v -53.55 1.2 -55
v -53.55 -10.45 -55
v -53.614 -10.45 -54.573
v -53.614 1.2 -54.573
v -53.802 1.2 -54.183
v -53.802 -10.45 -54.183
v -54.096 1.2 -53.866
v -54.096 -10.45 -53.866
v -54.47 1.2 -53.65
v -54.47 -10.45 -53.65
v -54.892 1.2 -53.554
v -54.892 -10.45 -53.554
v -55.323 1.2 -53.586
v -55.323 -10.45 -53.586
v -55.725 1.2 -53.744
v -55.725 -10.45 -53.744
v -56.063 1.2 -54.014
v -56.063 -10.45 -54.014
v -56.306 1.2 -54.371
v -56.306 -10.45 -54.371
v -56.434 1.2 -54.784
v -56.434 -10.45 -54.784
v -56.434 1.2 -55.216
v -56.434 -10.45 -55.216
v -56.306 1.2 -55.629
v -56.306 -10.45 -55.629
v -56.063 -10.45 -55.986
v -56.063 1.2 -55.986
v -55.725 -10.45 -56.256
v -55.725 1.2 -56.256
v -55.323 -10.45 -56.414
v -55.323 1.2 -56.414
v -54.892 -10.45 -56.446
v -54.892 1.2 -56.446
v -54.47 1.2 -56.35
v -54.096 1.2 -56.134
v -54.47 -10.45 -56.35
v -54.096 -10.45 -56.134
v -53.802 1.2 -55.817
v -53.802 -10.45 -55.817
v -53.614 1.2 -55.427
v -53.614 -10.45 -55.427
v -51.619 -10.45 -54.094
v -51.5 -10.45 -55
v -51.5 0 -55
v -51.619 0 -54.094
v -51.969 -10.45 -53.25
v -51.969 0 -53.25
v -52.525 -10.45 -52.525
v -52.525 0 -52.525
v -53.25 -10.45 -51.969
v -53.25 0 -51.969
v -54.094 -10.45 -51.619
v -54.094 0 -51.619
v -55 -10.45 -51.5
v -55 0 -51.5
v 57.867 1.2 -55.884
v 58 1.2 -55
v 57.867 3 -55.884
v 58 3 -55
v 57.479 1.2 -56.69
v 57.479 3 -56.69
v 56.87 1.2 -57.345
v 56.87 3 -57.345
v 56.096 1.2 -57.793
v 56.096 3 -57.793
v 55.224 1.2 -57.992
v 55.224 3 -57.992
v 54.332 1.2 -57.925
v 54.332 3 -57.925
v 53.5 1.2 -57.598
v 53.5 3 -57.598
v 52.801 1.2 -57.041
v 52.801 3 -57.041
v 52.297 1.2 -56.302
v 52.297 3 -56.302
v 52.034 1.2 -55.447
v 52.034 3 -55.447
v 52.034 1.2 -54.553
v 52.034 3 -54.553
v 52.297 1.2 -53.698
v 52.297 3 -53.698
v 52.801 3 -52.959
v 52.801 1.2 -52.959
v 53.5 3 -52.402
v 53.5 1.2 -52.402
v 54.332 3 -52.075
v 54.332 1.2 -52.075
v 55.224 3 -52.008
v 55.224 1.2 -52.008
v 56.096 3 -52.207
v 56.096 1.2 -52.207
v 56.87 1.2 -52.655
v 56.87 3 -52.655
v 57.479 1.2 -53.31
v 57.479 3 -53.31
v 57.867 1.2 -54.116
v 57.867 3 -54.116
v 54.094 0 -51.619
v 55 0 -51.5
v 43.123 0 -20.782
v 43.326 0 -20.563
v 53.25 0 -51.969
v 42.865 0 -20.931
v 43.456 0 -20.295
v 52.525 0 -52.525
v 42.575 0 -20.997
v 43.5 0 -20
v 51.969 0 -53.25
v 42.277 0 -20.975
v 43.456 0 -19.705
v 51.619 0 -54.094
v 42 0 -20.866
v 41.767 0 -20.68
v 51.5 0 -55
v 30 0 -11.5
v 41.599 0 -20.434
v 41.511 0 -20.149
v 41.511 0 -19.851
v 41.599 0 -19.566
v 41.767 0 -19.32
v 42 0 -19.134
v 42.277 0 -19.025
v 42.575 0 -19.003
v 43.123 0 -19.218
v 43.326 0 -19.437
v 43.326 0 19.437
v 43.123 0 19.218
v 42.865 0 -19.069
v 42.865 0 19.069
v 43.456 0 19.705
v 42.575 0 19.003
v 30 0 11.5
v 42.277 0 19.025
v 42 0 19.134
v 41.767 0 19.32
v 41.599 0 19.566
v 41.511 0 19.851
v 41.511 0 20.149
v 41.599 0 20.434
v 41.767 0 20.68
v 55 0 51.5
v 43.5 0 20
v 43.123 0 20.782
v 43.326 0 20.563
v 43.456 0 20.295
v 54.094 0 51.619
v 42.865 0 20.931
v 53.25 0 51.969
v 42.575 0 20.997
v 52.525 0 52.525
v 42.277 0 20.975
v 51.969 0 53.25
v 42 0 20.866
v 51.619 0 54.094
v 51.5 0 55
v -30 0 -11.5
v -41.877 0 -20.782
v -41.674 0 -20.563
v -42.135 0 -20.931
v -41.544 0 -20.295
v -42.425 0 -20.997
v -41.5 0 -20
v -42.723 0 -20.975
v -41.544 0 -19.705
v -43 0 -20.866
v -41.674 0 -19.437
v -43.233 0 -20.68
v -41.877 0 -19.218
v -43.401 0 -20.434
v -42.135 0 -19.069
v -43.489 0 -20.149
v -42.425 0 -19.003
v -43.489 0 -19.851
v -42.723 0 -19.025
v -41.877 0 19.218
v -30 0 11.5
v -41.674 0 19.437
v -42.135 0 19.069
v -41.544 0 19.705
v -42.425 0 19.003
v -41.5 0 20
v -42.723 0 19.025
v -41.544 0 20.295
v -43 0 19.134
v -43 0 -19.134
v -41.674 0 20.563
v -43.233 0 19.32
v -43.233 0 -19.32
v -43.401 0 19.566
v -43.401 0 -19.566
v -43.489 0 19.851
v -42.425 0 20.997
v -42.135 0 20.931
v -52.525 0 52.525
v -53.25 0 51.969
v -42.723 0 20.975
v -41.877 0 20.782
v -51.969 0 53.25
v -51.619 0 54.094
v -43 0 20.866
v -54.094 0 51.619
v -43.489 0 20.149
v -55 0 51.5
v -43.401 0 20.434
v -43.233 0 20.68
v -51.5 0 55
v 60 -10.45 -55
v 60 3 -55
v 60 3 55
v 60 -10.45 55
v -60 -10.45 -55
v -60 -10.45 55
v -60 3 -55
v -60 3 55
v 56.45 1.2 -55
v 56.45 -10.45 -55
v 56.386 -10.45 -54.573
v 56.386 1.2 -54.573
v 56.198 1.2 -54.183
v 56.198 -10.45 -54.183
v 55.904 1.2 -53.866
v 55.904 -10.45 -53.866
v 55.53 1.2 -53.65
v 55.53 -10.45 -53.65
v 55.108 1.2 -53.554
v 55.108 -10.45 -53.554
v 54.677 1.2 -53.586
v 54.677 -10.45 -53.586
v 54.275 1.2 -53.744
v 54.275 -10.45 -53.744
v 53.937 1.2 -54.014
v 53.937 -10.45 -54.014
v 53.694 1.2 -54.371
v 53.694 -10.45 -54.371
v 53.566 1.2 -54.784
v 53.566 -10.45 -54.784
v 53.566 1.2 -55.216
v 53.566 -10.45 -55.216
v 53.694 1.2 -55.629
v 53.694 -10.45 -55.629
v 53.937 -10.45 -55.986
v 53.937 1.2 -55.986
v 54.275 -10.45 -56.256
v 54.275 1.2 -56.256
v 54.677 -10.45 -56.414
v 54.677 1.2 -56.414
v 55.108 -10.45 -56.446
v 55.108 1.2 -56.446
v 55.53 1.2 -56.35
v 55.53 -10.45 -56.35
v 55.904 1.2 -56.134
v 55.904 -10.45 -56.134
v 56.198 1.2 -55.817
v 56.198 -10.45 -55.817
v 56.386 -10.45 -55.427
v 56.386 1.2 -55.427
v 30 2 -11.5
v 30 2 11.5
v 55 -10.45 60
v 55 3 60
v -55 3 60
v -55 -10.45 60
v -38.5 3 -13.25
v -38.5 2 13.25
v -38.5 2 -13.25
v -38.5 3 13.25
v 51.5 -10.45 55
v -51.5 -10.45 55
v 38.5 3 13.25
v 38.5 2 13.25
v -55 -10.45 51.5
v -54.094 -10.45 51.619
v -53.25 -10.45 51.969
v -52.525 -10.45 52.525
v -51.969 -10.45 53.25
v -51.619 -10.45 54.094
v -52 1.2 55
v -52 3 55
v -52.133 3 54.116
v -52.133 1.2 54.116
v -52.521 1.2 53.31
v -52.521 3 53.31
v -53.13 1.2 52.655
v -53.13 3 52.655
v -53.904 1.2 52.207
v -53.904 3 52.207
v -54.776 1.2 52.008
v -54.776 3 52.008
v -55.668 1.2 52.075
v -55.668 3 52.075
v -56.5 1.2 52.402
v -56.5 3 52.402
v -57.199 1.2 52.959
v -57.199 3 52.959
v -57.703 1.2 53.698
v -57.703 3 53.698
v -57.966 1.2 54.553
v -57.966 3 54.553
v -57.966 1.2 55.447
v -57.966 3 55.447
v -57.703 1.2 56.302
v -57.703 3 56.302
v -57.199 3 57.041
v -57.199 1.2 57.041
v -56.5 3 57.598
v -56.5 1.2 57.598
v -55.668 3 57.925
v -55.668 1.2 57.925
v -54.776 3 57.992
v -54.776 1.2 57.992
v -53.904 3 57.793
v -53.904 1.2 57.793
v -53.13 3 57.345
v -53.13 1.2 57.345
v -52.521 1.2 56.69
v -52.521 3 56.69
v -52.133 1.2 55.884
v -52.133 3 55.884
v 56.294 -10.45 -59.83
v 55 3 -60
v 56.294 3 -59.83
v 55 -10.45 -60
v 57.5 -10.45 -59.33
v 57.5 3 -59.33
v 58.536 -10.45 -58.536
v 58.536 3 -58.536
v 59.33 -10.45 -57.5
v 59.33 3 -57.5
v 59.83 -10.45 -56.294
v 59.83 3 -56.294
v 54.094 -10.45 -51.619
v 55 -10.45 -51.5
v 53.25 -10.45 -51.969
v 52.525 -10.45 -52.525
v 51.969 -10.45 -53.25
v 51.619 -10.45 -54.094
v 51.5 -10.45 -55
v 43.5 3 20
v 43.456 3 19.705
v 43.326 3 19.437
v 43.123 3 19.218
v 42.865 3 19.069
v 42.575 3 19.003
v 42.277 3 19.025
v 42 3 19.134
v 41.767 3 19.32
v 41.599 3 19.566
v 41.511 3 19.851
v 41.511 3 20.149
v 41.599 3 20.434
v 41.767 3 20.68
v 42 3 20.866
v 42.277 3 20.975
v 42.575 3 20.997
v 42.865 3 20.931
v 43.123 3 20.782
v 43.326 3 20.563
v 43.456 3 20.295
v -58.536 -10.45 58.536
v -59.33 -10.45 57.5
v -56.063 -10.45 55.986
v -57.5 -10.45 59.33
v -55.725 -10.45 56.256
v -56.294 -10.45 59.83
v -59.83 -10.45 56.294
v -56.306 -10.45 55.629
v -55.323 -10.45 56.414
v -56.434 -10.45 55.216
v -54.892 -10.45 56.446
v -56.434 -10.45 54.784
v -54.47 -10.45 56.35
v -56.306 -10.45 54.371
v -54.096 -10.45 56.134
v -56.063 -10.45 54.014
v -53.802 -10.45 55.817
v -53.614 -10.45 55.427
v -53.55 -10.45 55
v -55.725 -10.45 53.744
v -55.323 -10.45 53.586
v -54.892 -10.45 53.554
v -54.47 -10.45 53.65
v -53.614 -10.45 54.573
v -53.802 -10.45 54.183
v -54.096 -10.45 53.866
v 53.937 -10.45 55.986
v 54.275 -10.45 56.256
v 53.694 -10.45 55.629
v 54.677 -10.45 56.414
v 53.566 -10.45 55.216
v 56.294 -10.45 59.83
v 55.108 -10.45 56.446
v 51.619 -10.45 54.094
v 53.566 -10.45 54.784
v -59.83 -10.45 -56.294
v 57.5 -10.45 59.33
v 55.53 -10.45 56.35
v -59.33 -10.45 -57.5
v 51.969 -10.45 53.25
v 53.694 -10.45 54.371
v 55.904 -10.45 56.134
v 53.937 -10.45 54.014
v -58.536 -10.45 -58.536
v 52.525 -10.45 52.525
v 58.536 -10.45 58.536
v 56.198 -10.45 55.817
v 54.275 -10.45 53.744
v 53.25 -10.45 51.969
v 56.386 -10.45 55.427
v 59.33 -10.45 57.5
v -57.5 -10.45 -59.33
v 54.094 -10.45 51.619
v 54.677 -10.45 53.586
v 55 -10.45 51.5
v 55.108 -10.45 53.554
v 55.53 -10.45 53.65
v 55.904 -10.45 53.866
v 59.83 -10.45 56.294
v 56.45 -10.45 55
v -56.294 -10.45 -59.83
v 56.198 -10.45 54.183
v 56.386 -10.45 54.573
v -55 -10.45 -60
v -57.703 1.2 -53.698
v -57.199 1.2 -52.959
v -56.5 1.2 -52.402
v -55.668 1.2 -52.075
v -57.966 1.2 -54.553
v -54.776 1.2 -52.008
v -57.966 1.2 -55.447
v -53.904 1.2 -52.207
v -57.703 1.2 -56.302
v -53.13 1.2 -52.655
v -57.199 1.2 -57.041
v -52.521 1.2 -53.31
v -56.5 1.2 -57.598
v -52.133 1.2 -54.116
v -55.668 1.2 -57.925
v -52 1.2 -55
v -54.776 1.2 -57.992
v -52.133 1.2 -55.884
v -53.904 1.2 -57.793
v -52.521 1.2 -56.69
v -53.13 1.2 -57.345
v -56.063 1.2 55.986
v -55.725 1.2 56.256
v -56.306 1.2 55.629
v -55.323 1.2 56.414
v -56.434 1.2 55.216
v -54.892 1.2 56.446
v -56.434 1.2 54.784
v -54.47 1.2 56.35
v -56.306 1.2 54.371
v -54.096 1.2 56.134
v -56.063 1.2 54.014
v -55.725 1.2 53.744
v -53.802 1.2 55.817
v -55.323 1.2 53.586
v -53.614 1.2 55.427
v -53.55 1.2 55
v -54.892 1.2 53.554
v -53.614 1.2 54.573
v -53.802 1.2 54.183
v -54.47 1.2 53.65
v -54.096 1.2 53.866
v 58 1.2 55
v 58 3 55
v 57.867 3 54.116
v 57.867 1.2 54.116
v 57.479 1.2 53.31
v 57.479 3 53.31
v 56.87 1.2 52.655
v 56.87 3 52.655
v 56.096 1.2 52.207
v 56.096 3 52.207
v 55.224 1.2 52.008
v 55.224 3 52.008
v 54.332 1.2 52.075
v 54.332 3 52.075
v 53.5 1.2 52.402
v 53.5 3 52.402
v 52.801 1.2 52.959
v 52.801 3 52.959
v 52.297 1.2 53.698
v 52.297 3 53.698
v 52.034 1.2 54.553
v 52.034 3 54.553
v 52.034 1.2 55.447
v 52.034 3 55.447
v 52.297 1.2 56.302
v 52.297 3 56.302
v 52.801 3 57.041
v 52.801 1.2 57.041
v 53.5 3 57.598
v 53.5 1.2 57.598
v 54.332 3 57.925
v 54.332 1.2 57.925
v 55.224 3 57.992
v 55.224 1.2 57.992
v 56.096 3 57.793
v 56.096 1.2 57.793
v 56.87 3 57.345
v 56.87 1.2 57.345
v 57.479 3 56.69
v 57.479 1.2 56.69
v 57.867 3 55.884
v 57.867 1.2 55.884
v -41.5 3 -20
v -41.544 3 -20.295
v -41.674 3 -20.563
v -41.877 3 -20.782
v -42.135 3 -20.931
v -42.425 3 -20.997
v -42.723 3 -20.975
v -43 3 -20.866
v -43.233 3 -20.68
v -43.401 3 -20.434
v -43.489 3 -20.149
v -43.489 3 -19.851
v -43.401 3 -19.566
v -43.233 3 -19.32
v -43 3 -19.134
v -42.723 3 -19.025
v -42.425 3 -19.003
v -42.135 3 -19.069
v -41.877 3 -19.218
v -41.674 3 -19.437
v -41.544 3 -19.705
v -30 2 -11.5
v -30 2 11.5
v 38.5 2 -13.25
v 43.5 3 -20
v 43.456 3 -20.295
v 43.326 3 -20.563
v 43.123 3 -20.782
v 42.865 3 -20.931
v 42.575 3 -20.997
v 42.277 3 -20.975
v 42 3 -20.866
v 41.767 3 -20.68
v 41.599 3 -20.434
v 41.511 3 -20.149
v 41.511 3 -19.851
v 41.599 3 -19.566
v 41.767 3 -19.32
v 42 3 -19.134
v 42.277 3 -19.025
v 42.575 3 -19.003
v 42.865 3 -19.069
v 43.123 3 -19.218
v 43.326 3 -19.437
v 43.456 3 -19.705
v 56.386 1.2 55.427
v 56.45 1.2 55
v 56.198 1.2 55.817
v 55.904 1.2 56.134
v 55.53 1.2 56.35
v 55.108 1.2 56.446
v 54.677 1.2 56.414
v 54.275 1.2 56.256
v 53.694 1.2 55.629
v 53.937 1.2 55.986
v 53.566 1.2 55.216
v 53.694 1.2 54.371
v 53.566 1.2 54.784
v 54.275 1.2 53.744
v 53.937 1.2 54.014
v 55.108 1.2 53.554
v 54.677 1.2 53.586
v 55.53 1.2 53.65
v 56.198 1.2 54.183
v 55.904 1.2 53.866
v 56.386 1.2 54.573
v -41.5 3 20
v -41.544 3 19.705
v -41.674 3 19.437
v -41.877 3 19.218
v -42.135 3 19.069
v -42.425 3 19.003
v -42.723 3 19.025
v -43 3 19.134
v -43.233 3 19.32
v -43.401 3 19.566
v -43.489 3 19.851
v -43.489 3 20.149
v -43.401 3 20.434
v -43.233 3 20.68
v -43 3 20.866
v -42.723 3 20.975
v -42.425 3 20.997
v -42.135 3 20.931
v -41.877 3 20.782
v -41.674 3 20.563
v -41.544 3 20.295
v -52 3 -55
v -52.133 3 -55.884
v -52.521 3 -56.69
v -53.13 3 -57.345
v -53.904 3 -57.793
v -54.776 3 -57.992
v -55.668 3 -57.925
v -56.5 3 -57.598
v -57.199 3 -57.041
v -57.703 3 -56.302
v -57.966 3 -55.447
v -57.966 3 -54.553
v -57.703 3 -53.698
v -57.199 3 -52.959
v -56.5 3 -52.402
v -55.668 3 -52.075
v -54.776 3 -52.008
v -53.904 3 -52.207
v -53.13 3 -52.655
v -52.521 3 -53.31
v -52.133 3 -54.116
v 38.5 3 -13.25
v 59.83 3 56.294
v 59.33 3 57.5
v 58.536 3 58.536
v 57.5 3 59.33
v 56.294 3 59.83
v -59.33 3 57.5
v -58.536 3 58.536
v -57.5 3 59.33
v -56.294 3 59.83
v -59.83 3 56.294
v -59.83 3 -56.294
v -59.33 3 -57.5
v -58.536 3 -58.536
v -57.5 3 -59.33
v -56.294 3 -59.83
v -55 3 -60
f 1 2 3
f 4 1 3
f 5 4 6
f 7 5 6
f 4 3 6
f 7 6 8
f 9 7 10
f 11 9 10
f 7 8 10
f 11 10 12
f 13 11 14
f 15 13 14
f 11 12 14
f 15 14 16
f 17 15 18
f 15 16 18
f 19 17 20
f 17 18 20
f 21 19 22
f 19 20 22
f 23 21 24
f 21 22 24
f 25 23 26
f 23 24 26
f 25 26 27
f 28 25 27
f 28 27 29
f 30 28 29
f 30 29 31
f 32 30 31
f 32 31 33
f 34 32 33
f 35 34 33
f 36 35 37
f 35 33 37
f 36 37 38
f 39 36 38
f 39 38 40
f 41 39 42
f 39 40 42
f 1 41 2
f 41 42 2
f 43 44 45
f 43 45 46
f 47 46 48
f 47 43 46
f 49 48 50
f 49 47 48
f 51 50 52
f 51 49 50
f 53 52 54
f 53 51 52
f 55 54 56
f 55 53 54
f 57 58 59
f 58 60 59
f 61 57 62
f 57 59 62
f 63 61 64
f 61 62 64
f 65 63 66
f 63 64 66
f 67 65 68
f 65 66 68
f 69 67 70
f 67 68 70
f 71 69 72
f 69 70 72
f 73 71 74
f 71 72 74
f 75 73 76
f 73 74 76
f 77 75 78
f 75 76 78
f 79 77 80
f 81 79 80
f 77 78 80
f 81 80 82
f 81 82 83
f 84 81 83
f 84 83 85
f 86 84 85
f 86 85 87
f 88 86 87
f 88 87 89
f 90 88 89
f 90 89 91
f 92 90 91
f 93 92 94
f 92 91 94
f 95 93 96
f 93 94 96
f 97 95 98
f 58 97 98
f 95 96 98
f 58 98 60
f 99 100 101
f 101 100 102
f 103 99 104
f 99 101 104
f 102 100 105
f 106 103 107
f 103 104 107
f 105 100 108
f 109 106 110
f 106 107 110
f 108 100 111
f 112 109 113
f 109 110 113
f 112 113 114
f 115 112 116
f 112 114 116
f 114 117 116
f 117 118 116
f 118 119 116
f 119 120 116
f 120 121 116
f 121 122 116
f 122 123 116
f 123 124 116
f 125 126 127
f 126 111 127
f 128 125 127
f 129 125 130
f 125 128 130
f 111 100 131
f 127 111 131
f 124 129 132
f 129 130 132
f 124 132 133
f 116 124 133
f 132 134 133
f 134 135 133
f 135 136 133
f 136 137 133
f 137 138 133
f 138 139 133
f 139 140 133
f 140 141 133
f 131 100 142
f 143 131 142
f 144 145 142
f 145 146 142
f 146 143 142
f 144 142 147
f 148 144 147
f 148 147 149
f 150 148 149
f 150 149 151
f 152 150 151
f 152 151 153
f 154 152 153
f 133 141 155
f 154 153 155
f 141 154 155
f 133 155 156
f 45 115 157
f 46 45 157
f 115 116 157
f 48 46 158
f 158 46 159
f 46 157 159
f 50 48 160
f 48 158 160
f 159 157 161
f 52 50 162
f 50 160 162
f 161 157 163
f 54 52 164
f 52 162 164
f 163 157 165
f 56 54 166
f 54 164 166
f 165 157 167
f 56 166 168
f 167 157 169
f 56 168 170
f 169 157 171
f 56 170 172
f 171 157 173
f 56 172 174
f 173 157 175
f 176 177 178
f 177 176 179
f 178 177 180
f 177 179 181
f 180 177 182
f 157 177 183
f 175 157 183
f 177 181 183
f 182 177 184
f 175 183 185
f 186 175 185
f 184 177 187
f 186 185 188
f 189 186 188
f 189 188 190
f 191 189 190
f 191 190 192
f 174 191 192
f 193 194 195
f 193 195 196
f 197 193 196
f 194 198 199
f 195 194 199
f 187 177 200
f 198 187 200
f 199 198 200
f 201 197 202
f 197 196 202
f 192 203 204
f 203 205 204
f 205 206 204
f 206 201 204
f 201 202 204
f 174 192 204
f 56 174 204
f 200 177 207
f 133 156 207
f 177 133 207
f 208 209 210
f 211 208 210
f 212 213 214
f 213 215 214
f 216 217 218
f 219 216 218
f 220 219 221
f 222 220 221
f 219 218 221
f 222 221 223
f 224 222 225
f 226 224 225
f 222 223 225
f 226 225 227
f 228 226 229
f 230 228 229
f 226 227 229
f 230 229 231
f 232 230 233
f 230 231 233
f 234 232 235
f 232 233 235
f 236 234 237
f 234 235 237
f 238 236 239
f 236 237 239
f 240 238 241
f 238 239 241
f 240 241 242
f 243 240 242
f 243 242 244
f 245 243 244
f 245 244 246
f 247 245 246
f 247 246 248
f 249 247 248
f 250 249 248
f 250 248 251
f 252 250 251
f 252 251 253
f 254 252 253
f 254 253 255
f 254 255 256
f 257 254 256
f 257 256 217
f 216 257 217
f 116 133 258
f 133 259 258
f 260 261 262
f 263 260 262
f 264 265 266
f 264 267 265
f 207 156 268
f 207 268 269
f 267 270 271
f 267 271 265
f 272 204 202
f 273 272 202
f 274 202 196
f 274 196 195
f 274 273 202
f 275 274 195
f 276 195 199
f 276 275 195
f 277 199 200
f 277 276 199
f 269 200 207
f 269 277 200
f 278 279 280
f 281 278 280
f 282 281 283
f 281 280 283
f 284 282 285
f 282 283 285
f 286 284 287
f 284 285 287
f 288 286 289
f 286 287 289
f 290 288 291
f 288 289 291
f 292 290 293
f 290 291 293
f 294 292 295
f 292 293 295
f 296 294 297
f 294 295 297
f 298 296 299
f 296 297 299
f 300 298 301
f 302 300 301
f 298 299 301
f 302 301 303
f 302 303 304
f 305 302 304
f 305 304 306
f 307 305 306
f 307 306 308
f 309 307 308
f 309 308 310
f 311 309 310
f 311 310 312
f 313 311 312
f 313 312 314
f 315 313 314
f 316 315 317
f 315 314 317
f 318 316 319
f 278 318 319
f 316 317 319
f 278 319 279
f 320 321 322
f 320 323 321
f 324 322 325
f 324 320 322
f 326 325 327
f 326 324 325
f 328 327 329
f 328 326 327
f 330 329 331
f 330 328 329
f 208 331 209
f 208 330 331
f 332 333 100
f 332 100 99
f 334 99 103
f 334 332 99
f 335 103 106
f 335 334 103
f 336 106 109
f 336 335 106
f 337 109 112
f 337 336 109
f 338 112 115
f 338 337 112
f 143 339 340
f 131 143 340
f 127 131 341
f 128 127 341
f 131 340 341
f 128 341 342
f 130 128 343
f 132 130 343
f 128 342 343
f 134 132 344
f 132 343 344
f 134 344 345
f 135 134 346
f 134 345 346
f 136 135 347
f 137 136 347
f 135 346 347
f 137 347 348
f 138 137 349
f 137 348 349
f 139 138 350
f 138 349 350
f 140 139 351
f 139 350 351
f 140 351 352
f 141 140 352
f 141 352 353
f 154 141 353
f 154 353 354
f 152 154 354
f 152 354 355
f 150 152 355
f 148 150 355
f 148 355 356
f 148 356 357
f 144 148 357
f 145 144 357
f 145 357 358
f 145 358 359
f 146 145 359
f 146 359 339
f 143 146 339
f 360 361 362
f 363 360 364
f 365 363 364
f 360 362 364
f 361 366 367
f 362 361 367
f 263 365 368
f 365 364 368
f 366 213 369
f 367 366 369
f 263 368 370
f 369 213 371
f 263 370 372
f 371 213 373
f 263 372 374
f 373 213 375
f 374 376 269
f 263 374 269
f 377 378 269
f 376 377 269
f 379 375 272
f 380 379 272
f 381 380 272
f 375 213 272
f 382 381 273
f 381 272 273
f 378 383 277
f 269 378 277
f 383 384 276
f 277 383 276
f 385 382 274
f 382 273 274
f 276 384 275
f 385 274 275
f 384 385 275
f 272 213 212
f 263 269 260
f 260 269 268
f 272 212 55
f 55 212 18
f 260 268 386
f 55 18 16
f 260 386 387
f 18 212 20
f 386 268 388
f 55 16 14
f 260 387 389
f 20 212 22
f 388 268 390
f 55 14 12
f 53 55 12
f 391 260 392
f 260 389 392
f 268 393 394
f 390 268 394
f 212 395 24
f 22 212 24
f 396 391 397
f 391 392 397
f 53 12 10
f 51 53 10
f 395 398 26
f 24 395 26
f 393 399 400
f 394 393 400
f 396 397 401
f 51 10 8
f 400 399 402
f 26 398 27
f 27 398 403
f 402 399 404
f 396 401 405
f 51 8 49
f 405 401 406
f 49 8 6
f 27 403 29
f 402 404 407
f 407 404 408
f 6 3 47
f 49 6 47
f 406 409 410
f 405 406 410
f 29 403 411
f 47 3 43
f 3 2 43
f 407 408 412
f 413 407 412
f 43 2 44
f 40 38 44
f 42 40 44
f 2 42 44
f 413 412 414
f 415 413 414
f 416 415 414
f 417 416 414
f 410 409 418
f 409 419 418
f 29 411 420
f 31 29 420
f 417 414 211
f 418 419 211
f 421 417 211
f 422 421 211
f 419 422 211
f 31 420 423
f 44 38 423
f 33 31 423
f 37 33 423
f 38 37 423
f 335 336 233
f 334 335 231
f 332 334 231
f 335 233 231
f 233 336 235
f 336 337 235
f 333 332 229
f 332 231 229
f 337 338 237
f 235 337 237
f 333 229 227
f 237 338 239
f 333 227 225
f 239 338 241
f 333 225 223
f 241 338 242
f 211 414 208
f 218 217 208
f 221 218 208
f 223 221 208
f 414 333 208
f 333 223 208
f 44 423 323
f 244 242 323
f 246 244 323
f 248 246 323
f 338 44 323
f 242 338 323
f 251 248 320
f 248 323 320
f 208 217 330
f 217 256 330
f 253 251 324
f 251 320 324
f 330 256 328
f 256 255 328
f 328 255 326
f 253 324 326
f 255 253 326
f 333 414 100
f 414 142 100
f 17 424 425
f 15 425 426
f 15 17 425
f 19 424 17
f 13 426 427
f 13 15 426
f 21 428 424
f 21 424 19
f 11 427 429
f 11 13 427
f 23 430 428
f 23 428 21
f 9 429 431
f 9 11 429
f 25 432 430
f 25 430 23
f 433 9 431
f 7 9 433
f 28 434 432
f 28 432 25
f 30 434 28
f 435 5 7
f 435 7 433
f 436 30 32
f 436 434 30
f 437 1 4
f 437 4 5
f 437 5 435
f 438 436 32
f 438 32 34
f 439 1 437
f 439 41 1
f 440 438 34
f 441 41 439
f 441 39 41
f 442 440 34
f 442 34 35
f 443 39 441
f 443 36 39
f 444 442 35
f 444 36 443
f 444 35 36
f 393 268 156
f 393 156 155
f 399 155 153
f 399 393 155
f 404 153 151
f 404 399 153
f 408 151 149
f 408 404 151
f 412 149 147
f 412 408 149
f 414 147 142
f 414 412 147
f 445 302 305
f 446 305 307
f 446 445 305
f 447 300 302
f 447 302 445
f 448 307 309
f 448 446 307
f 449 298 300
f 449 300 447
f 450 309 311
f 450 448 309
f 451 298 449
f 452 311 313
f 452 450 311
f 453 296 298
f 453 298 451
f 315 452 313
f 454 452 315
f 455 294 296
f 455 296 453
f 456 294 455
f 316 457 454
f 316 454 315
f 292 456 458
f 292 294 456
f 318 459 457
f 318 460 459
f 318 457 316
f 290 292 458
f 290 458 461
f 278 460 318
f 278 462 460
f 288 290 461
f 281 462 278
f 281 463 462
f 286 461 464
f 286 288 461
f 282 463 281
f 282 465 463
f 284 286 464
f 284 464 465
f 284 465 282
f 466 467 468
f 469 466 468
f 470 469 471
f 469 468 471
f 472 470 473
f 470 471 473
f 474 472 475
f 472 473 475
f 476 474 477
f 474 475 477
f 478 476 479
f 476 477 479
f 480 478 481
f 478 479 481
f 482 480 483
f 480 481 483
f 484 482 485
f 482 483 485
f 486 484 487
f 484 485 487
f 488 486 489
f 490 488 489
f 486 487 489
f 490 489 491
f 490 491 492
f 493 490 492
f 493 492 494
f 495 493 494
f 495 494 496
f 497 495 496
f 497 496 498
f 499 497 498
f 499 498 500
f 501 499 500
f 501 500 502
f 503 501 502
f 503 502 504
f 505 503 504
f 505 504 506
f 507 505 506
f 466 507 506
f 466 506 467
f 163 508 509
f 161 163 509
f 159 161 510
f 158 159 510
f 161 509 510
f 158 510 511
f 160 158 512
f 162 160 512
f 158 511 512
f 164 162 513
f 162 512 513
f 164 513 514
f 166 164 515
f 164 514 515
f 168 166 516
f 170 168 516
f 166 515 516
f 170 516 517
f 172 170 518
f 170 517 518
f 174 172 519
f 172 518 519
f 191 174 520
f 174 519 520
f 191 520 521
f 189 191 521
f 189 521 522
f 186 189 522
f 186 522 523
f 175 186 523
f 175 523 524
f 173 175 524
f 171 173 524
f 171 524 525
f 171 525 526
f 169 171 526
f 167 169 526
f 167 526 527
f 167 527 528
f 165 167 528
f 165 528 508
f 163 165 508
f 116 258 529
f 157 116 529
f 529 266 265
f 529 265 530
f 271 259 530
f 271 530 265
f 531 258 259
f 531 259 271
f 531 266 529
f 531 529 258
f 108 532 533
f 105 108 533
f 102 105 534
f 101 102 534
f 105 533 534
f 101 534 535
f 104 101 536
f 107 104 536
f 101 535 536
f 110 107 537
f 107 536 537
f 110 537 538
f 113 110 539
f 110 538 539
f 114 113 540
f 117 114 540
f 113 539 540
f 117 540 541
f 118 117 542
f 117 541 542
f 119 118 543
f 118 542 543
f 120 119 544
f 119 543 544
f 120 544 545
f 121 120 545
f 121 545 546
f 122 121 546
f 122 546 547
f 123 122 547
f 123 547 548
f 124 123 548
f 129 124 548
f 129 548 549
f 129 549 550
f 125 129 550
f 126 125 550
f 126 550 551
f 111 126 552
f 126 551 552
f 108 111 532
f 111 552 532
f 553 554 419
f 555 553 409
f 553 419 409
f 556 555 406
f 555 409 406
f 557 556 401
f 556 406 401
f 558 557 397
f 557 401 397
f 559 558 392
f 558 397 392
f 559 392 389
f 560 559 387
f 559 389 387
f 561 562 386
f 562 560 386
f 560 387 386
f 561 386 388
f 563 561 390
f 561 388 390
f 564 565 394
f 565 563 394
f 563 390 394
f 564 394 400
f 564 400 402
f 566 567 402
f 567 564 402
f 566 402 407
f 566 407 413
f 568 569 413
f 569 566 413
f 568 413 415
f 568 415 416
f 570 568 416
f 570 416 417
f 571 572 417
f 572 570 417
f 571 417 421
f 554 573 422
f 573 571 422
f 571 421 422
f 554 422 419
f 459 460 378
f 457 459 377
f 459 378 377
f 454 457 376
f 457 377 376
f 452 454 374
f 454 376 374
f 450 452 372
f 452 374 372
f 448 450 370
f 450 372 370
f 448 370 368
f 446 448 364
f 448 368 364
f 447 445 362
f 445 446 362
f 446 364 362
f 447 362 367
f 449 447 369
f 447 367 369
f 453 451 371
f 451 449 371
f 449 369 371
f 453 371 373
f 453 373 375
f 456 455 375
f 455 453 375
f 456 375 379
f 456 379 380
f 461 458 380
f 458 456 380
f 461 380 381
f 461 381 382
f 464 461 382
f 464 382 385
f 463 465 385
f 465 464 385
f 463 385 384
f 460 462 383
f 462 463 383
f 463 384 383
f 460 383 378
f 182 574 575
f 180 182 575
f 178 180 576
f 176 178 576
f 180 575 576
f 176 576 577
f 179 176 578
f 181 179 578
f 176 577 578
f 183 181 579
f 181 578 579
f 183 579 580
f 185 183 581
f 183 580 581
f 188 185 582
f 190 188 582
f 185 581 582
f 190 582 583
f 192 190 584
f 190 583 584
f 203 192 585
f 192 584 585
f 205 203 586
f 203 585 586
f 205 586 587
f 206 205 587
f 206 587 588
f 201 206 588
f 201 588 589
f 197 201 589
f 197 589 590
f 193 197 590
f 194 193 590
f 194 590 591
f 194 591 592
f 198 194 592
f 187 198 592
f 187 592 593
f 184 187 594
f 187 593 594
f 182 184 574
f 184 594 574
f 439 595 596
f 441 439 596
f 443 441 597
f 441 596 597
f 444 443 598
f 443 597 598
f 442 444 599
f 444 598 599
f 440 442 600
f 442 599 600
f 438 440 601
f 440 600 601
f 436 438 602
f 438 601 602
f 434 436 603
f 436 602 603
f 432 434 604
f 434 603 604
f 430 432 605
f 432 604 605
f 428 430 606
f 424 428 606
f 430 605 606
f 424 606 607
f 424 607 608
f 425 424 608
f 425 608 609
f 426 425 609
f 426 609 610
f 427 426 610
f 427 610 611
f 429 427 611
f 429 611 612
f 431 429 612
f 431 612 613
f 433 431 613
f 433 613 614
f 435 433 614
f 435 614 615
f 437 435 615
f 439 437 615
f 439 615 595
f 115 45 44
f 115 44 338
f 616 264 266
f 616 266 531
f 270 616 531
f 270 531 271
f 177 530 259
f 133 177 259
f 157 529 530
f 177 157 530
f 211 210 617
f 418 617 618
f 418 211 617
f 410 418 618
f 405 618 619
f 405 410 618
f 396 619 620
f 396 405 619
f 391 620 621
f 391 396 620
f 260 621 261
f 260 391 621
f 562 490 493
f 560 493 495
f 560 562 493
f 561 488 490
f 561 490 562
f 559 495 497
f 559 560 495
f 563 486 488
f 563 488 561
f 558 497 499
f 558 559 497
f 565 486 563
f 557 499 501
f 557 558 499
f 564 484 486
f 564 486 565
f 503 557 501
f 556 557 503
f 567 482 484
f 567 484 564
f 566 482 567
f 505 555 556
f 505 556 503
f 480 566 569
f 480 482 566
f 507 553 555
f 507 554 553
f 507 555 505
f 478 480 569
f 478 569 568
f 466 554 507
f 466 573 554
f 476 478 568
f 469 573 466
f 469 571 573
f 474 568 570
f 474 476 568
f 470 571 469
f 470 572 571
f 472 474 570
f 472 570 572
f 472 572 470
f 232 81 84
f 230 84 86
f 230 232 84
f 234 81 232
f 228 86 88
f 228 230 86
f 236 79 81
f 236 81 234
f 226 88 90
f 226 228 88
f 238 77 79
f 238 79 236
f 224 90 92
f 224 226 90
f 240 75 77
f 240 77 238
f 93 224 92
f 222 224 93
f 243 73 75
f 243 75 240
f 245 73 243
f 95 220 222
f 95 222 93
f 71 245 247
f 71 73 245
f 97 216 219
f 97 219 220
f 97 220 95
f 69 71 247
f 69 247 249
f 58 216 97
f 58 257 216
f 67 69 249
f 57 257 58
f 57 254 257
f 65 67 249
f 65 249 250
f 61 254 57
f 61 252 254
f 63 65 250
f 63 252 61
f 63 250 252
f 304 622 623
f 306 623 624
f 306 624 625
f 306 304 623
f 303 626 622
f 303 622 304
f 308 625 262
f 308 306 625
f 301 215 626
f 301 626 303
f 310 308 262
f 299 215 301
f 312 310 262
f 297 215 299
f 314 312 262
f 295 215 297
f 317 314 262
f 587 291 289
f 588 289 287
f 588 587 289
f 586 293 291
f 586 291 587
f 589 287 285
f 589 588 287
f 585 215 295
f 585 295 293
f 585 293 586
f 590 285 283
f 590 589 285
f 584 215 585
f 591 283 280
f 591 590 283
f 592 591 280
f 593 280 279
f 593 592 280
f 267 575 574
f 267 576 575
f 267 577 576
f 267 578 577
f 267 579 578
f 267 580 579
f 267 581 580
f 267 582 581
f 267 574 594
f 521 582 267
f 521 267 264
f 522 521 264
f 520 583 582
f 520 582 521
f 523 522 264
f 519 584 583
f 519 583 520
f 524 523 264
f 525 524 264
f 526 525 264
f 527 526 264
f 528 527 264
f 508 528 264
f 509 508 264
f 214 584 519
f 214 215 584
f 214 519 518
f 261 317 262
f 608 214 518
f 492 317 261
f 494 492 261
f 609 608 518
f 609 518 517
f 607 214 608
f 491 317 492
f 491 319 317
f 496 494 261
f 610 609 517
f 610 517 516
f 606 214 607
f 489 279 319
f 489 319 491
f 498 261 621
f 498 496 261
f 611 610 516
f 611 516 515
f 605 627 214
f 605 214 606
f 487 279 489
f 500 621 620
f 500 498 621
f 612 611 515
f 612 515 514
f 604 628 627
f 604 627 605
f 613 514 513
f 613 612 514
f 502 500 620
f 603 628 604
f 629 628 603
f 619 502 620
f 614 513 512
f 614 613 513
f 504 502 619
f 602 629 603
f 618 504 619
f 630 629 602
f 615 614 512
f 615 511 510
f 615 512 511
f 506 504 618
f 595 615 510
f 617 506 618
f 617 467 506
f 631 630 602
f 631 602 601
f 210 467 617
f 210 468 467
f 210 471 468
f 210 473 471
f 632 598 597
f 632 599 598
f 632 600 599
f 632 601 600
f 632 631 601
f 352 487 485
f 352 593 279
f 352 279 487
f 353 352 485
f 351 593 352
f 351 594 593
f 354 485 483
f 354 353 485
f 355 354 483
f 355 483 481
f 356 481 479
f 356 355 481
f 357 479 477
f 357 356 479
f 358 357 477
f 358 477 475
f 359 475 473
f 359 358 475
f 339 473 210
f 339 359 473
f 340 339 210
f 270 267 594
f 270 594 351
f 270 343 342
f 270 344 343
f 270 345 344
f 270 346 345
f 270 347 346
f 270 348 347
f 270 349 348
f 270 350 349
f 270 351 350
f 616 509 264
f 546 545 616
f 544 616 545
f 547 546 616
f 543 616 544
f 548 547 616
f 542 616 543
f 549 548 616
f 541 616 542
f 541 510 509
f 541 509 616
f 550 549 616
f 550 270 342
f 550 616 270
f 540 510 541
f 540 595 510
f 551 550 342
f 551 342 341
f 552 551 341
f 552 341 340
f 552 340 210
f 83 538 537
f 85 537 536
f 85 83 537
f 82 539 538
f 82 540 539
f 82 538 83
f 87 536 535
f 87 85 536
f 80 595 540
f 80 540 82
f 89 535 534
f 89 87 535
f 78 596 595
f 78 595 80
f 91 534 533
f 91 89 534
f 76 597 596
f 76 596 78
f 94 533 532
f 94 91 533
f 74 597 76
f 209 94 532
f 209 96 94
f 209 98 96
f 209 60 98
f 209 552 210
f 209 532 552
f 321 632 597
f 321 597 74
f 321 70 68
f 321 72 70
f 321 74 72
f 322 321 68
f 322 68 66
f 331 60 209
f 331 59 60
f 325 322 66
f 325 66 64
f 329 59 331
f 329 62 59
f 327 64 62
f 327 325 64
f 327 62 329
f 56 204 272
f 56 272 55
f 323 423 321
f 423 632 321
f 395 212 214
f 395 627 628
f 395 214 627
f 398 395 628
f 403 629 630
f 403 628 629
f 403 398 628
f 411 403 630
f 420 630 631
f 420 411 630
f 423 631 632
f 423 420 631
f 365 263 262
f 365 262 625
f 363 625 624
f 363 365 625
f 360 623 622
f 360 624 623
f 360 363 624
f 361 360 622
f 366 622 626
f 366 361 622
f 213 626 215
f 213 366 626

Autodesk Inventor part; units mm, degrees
ref_plane "YZ Plane" through (0, 0, 0) normal (1, 0, 0) x (0, 1, 0)
ref_plane "XZ Plane" through (0, 0, 0) normal (0, 1, 0) x (-1, 0, 0)
ref_plane "XY Plane" through (0, 0, 0) normal (0, 0, 1) x (1, 0, 0)
sketch "Sketch1" plane through (0, 0, 0) normal (0, 1, 0) x (-1, 0, 0)
  line L0 (-55, 55) -> (55, 55)
  line L1 (55, 55) -> (55, -55)
  line L2 (55, -55) -> (-55, -55)
  line L3 (-55, -55) -> (-55, 55)
  line L4 (-55, 55) -> (55, -55) construction
  line L5 (55, 55) -> (-55, -55) construction
  line L6 (-12.5, 37.5) -> (12.5, 37.5) construction
  line L7 (12.5, 37.5) -> (12.5, -37.5) construction
  line L8 (12.5, -37.5) -> (-12.5, -37.5) construction
  line L9 (-12.5, -37.5) -> (-12.5, 37.5) construction
  line L10 (-12.5, 37.5) -> (12.5, -37.5) construction
  line L11 (12.5, 37.5) -> (-12.5, -37.5) construction
  line L12 (-37.5, 37.5) -> (37.5, 37.5) construction
  line L13 (37.5, 37.5) -> (37.5, -37.5) construction
  line L14 (37.5, -37.5) -> (-37.5, -37.5) construction
  line L15 (-37.5, -37.5) -> (-37.5, 37.5)
  line L16 (-37.5, 37.5) -> (37.5, -37.5) construction
  line L17 (37.5, 37.5) -> (-37.5, -37.5) construction
  circle A0 centre (37.5, -37.5) radius 2 construction
  circle A1 centre (37.5, 37.5) radius 2 construction
  circle A2 centre (-37.5, 37.5) radius 2 construction
  circle A3 centre (-37.5, -37.5) radius 2 construction
  point P0 (0, 0)
  dimension "d0" = 110
  dimension "d1" = 110
  dimension "d2" = 25
  dimension "d3" = 75
  dimension "d4" = 75
  dimension "d5" = 4
  dimension "d6" = 4
  dimension "d7" = 4
  dimension "d8" = 4
extrude "Extrusion1" add sketch "Sketch1" along normal blind 3
sketch "Sketch3" plane through (0, 3, 0) normal (0, 1, 0) x (1, 0, 0)
  line L0 (35, -35) -> (-35, -35)
  line L1 (-35, -35) -> (-35, 35)
  line L2 (-35, 35) -> (35, 35)
  line L3 (35, 35) -> (35, -35)
  line L4 (35, -35) -> (-35, 35) construction
  line L5 (-35, -35) -> (35, 35) construction
  point P0 (0, 0)
  dimension "d18" = 70
  dimension "d19" = 70
extrude "Extrusion3" [suppressed]
fillet "Fillet1" [suppressed]
sketch "Sketch4" plane through (0, 3, 0) normal (0, 1, 0) x (1, 0, 0)
  line L0 (28, -16) -> (42, -16)
  line L1 (42, -16) -> (42, 16)
  line L2 (42, 16) -> (28, 16)
  line L3 (28, 16) -> (28, -16)
  line L4 (28, -16) -> (42, 16) construction
  line L5 (42, -16) -> (28, 16) construction
  line L6 (35, 33) -> (35, -33) projected
  point P0 (0, 0)
  point P1 (35, 0)
  dimension "d23" = 14
  dimension "d24" = 32
extrude "Extrusion4" [suppressed]
sketch "Sketch5" plane through (0, 3, 0) normal (0, 1, 0) x (1, 0, 0)
  line L0 (-30, -11.5) -> (30, -11.5)
  line L1 (30, -11.5) -> (30, 11.5)
  line L2 (30, 11.5) -> (-30, 11.5)
  line L3 (-30, 11.5) -> (-30, -11.5)
  line L4 (-30, -11.5) -> (30, 11.5) construction
  line L5 (30, -11.5) -> (-30, 11.5) construction
  point P0 (0, 0)
  dimension "d31" = 23
  dimension "d32" = 60
extrude "Extrusion5" cut sketch "Sketch5" against normal blind 10
sketch "Sketch6" plane through (0, 3, 0) normal (0, 1, 0) x (1, 0, 0)
  line L0 (-38.5, 13.25) -> (38.5, 13.25)
  line L1 (38.5, 13.25) -> (38.5, -13.25)
  line L2 (38.5, -13.25) -> (-38.5, -13.25)
  line L3 (-38.5, -13.25) -> (-38.5, 13.25)
  line L4 (-38.5, 13.25) -> (38.5, -13.25) construction
  line L5 (38.5, 13.25) -> (-38.5, -13.25) construction
  point P0 (0, 0)
  dimension "d35" = 26.5
  dimension "d36" = 77
extrude "Extrusion6" cut sketch "Sketch6" against normal blind 1
sketch "Sketch7" plane through (0, 3, 0) normal (0, 1, 0) x (1, 0, 0)
  line L0 (-42.5, -20) -> (42.5, -20) construction
  line L1 (42.5, -20) -> (42.5, 20) construction
  line L2 (42.5, 20) -> (-42.5, 20) construction
  line L3 (-42.5, 20) -> (-42.5, -20) construction
  line L4 (-42.5, -20) -> (42.5, 20) construction
  line L5 (42.5, -20) -> (-42.5, 20) construction
  circle A0 centre (-42.5, 20) radius 1
  circle A1 centre (42.5, 20) radius 1
  circle A2 centre (42.5, -20) radius 1
  circle A3 centre (-42.5, -20) radius 1
  point P0 (0, 0)
  dimension "d39" = 40
  dimension "d40" = 85
  dimension "d41" = 2
  dimension "d42" = 2
  dimension "d43" = 2
  dimension "d44" = 2
extrude "Extrusion7" cut sketch "Sketch7" against normal through all
sketch "Sketch8" plane through (0, 3, 0) normal (0, 1, 0) x (1, 0, 0)
  line L0 (55, -55) -> (55, 55) projected
  line L1 (-55, 55) -> (55, 55)
  line L2 (55, 55) -> (55, -55)
  line L3 (55, -55) -> (-55, -55)
  line L4 (-55, -55) -> (-55, 55)
  line L5 (-55, 55) -> (55, -55) construction
  line L6 (55, 55) -> (-55, -55) construction
  line L7 (-60, 60) -> (60, 60)
  line L8 (60, 60) -> (60, -60)
  line L9 (60, -60) -> (-60, -60)
  line L10 (-60, -60) -> (-60, 60)
  line L11 (-60, 60) -> (60, -60) construction
  line L12 (60, 60) -> (-60, -60) construction
  point P0 (0, 0)
  dimension "d47" = 5
extrude "Extrusion8" add sketch "Sketch8" against normal blind 13.45
sketch "Sketch9" plane through (0, -10.45, 0) normal (0, -1, 0) x (1, 0, 0)
  line L0 (-55, 55) -> (55, 55) projected
  circle A0 centre (-55, 55) radius 3.5
  line L1 (55, 55) -> (55, -55) projected
  circle A1 centre (55, 55) radius 3.5
  line L2 (55, -55) -> (-55, -55) projected
  circle A2 centre (55, -55) radius 3.5
  circle A3 centre (-55, -55) radius 3.5
  point P0 (0, 0)
  dimension "d50" = 7
  dimension "d51" = 7
  dimension "d52" = 7
  dimension "d53" = 7
extrude "Extrusion9" add sketch "Sketch9" against normal blind 13.45
fillet "Fillet3" radius 5 4 edges at (60, -3.725, -60) (60, -3.725, 60) (-60, -3.725, -60) (-60, -3.725, 60)
sketch "Sketch10" plane through (0, -10.45, 0) normal (0, -1, 0) x (1, 0, 0)
  arc A0 (-55, 51.5) -> (-51.5, 55) centre (-55, 55) ccw projected
  circle A1 centre (-55, 55) radius 1.45
  arc A2 (51.5, 55) -> (55, 51.5) centre (55, 55) ccw projected
  circle A3 centre (55, 55) radius 1.45
  arc A4 (55, -51.5) -> (51.5, -55) centre (55, -55) ccw projected
  circle A5 centre (55, -55) radius 1.45
  arc A6 (-51.5, -55) -> (-55, -51.5) centre (-55, -55) ccw projected
  circle A7 centre (-55, -55) radius 1.45
  point P0 (0, 0)
  dimension "d57" = 2.9
  dimension "d58" = 2.9
  dimension "d59" = 2.9
  dimension "d60" = 2.9
extrude "Extrusion10" cut sketch "Sketch10" against normal blind 13.45
sketch "Sketch11" plane through (0, 3, 0) normal (0, 1, 0) x (1, 0, 0)
  circle A0 centre (-55, 55) radius 1.45 projected
  circle A1 centre (-55, 55) radius 3
  circle A2 centre (55, 55) radius 1.45 projected
  circle A3 centre (55, 55) radius 3
  circle A4 centre (55, -55) radius 1.45 projected
  circle A5 centre (55, -55) radius 3
  circle A6 centre (-55, -55) radius 1.45 projected
  circle A7 centre (-55, -55) radius 3
  point P0 (0, 0)
  dimension "d63" = 6
  dimension "d64" = 6
  dimension "d65" = 6
  dimension "d66" = 6
extrude "Extrusion11" cut sketch "Sketch11" against normal blind 1.8 contours A0 | A1 | A2 | A3 | A5 | A7
properties part number "3D printed box top"
